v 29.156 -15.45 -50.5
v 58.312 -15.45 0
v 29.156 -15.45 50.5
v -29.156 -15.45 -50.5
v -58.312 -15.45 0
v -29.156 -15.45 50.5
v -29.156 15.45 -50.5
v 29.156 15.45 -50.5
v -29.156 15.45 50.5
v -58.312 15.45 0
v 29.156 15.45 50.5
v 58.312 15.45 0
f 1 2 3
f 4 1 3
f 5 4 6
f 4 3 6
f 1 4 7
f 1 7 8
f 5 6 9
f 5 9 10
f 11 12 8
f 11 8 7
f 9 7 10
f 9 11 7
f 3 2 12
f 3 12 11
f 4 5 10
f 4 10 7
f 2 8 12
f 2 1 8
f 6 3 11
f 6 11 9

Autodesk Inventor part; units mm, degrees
ref_plane "YZ Plane" through (0, 0, 0) normal (1, 0, 0) x (0, 1, 0)
ref_plane "XZ Plane" through (0, 0, 0) normal (0, 1, 0) x (-1, 0, 0)
ref_plane "XY Plane" through (0, 0, 0) normal (0, 0, 1) x (1, 0, 0)
sketch "Sketch1" plane through (0, 0, 0) normal (0, 1, 0) x (-1, 0, 0)
  line L0 (-29.1562, -50.5) -> (-58.3124, 0)
  line L1 (-58.3124, 0) -> (-29.1562, 50.5)
  line L2 (-29.1562, 50.5) -> (29.1562, 50.5)
  line L3 (29.1562, 50.5) -> (58.3124, 0)
  line L4 (58.3124, 0) -> (29.1562, -50.5)
  line L5 (29.1562, -50.5) -> (-29.1562, -50.5)
  point P0 (0, 0)
  point P1 (0, 0)
  dimension "d0" = 101
extrude "Extrusion1" add sketch "Sketch1" along normal mid plane 30.9
properties part number "Hex_Reds" material "Paper"
